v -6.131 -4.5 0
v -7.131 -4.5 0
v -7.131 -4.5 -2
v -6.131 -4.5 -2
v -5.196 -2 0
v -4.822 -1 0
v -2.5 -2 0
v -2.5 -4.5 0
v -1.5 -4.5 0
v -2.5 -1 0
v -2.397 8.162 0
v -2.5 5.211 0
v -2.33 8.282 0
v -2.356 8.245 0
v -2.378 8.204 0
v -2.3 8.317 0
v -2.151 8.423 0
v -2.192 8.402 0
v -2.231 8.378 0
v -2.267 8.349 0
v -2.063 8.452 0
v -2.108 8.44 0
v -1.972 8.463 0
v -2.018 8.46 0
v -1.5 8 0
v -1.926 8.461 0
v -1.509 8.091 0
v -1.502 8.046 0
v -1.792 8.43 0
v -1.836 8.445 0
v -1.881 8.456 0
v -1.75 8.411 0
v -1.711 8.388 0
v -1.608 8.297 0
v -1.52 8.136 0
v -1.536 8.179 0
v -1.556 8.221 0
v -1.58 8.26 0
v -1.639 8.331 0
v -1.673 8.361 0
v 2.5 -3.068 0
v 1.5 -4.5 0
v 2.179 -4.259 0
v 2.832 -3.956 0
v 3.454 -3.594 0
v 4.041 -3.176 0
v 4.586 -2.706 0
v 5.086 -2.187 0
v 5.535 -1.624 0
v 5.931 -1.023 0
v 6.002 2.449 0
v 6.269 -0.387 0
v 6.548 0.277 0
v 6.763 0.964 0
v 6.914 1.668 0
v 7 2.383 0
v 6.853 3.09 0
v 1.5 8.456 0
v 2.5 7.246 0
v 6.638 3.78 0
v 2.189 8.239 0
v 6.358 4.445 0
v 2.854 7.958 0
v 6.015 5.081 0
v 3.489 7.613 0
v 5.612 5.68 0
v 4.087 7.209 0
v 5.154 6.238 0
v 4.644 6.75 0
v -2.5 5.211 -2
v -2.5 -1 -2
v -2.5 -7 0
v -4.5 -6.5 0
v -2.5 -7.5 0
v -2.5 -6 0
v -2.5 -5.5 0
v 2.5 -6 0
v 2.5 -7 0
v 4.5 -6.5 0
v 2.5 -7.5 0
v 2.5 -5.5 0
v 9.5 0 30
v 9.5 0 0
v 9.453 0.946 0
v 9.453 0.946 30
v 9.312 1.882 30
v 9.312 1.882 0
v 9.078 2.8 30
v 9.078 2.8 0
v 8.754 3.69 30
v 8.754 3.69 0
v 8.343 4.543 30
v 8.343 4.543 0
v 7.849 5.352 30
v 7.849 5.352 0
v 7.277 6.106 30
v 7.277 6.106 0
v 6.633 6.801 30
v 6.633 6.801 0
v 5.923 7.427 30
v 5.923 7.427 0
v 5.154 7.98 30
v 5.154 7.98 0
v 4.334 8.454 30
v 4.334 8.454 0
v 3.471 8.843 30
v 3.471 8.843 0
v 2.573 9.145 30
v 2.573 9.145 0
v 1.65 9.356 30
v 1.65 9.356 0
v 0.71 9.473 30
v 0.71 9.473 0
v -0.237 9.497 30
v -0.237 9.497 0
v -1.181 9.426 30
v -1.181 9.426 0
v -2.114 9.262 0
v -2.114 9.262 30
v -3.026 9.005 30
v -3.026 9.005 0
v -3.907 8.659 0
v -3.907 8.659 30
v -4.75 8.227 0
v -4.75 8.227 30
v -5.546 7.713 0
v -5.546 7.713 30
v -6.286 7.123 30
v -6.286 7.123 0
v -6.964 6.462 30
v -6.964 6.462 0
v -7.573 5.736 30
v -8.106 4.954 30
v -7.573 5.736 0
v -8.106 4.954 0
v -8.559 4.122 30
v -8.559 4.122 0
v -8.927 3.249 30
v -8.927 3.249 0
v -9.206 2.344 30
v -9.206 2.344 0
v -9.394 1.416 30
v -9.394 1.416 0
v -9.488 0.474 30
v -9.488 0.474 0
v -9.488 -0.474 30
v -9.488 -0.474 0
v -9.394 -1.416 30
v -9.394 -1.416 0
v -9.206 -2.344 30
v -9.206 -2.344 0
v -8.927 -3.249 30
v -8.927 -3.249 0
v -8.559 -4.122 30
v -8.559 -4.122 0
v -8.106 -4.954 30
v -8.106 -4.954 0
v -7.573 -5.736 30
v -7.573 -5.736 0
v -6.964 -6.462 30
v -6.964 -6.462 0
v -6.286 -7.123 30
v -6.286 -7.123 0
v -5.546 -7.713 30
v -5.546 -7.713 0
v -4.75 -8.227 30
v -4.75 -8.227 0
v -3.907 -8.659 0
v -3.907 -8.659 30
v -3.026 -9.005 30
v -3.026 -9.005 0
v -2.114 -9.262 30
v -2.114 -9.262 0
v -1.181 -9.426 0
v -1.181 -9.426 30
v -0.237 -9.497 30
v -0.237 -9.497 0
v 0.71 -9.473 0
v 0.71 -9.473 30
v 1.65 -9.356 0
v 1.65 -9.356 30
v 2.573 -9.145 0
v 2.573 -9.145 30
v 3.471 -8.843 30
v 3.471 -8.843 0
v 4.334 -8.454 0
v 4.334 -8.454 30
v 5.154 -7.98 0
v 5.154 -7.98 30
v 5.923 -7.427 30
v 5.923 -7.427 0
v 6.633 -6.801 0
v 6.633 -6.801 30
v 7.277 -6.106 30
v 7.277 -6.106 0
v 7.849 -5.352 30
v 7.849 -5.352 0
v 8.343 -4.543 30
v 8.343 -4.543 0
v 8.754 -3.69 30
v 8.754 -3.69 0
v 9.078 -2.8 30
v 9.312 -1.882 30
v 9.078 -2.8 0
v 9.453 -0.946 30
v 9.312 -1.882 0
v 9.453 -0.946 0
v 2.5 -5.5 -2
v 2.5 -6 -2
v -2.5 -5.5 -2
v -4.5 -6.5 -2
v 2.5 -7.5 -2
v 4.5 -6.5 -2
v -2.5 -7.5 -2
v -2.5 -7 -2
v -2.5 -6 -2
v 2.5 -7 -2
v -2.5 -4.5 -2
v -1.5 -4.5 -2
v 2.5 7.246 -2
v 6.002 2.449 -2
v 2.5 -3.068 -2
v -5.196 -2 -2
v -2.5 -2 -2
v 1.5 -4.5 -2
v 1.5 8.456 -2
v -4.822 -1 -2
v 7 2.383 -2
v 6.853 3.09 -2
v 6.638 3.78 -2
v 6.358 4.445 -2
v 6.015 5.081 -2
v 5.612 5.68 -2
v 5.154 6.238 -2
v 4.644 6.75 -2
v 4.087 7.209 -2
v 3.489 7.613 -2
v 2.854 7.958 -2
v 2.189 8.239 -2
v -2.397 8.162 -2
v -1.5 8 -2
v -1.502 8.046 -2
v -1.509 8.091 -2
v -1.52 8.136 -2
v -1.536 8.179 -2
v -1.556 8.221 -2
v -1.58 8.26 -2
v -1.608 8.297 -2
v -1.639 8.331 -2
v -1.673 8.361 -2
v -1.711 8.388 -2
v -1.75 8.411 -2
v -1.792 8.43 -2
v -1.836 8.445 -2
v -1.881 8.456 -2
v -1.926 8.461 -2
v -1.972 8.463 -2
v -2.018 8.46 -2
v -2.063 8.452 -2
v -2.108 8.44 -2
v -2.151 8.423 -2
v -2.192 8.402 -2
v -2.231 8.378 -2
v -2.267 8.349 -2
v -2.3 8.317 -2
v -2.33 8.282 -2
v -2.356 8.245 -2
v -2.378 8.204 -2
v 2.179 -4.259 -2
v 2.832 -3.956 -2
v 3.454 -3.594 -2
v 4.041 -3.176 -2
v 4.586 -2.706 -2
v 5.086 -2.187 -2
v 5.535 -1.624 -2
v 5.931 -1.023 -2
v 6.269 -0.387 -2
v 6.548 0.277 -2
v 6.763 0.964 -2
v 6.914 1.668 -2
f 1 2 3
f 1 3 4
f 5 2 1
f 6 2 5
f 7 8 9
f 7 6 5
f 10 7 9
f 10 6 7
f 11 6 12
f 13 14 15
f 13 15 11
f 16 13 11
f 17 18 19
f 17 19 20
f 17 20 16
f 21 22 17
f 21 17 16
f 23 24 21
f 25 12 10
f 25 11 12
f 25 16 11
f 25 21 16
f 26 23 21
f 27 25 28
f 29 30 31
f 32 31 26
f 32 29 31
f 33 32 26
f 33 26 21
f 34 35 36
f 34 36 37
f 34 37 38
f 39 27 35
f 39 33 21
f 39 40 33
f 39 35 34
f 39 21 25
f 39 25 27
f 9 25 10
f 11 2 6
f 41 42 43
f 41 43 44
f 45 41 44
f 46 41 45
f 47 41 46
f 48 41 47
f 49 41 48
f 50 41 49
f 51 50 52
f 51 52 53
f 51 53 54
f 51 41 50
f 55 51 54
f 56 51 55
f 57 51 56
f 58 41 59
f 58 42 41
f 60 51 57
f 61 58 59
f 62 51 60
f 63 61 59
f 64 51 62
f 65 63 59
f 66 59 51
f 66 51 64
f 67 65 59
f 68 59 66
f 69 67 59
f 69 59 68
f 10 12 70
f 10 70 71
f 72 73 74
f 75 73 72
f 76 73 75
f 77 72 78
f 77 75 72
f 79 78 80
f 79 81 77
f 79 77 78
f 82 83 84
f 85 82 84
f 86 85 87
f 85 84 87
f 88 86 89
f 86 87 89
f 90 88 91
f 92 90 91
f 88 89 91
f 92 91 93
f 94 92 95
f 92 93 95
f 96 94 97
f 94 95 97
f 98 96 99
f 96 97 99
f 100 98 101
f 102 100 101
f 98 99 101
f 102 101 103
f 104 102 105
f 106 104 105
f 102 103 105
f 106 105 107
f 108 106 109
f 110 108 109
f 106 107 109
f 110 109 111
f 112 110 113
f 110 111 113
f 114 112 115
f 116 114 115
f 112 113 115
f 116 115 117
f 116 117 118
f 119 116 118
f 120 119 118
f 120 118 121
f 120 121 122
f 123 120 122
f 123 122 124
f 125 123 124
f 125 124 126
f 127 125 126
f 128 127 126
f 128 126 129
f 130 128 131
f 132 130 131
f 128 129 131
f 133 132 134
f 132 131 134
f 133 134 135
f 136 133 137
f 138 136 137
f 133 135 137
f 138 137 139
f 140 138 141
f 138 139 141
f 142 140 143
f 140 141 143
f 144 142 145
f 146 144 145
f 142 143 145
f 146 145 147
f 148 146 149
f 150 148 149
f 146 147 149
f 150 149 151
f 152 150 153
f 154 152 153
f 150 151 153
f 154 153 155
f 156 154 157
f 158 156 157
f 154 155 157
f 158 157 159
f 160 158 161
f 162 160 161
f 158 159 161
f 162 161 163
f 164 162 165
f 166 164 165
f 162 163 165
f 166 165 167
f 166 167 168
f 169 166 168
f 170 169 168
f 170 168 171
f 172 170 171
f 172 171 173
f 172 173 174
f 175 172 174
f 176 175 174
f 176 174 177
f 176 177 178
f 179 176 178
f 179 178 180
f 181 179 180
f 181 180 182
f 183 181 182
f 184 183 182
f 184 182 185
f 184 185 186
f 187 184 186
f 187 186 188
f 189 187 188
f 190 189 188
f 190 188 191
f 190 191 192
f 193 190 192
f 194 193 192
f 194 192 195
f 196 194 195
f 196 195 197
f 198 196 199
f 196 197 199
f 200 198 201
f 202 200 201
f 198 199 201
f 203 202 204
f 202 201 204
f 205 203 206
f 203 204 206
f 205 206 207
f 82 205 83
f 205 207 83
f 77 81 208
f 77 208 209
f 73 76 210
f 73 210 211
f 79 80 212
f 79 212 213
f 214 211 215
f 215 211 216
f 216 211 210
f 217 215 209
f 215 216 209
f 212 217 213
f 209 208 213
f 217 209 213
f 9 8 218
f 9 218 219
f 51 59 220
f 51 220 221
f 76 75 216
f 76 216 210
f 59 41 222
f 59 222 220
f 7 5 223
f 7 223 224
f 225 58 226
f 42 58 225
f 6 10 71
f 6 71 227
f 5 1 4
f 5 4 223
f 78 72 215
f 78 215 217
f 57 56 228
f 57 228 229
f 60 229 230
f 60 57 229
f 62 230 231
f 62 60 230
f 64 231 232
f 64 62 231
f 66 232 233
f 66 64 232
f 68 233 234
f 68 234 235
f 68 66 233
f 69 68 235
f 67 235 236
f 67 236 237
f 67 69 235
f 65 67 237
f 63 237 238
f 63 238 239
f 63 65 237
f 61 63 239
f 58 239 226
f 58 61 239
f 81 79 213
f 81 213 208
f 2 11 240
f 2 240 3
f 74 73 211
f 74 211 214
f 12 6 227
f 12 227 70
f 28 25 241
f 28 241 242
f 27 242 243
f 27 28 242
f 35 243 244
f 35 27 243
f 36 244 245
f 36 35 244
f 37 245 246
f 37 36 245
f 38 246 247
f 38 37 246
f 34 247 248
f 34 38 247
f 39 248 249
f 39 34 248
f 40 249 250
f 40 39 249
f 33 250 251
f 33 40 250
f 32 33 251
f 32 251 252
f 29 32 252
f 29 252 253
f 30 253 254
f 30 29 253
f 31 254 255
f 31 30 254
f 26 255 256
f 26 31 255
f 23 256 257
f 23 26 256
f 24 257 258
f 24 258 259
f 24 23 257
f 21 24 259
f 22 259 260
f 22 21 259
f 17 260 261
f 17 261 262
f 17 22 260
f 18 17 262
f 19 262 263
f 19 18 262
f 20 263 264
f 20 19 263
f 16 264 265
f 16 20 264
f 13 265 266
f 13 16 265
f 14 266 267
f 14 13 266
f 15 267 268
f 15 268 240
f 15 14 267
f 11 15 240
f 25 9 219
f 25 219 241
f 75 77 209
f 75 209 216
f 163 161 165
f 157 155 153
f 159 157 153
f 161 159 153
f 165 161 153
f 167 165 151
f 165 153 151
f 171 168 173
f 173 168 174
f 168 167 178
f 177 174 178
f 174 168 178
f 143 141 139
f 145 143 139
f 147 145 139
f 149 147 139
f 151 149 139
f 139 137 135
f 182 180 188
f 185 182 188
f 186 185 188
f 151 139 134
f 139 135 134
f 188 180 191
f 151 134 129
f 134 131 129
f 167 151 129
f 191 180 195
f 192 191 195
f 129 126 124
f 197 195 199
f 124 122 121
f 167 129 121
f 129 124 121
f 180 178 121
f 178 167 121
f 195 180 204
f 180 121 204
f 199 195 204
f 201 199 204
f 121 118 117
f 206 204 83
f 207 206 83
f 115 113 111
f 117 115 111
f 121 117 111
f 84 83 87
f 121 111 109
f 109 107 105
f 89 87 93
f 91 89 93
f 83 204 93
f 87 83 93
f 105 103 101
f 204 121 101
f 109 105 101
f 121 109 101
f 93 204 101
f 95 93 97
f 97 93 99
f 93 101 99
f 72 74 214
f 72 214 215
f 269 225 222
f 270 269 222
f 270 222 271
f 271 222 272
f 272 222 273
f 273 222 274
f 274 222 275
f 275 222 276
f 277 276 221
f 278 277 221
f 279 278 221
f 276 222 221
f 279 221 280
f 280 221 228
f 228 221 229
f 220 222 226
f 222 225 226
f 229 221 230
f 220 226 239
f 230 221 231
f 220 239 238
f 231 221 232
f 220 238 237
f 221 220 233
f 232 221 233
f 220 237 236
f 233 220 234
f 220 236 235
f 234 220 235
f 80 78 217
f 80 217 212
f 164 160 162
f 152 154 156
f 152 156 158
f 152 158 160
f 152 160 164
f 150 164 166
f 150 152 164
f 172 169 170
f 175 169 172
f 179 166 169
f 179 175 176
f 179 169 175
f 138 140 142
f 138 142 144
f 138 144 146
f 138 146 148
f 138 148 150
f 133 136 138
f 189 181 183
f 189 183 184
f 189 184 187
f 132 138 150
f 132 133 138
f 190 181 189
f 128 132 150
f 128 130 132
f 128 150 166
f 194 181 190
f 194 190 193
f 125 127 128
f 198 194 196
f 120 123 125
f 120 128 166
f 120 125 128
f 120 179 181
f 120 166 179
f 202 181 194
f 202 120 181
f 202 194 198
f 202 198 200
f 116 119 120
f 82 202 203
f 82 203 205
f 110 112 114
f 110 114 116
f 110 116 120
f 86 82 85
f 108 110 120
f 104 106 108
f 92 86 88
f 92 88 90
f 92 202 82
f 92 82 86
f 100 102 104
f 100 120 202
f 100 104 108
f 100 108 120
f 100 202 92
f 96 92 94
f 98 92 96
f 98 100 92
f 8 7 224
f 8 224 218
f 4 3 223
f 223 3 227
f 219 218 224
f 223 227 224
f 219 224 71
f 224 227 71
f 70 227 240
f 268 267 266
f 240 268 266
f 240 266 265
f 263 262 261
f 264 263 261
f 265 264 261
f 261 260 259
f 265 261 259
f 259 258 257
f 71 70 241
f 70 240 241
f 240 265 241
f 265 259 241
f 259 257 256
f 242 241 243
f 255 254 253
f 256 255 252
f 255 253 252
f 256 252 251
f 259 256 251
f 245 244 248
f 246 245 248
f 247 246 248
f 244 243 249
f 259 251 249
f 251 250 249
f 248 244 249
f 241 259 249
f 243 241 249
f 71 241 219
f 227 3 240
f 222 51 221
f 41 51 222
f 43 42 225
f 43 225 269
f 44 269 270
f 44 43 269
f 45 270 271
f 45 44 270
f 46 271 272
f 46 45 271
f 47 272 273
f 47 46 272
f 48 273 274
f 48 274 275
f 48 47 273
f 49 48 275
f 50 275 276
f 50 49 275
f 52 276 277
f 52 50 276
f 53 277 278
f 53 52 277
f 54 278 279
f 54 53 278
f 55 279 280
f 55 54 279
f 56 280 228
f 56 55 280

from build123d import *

# Parameters (mm, degrees)
F1_DEPTH = 2
F0_R     = 9.5
F2_DEPTH = 30


with BuildPart() as f1:
    # F0 (on Top) → F1 (new body)
    with BuildSketch(Plane.XY):
        with BuildLine():
            Line((-2.5, -4.5), (-1.5, -4.5))
            Line((-1.5, -4.5), (-1.5, 8))
            ThreePointArc((-1.5, 8), (-1.8805656371, 8.4555551787), (-2.3965696716, 8.1621262073))
            Line((-2.3965696716, 8.1621262073), (-7.1307446703, -4.5))
            Line((-7.1307446703, -4.5), (-6.1307446703, -4.5))
            Line((-6.1307446703, -4.5), (-5.1960329715, -2))
            Line((-5.1960329715, -2), (-2.5, -2))
            Line((-2.5, -2), (-2.5, -4.5))
        make_face()
        Polygon((-2.5, -1), (-4.8221482921, -1), (-2.5, 5.210867734), align=None, mode=Mode.SUBTRACT)
    extrude(amount=-F1_DEPTH)


with BuildPart() as f1b:
    # F0 (on Top) → F1, piece 2 (new body)
    with BuildSketch(Plane.XY):
        with BuildLine():
            Line((1.5, 8.4555551787), (1.5, -4.5))
            ThreePointArc((1.5, -4.5), (5.317050605, -1.9109756291), (7, 2.3832767911))
            ThreePointArc((7, 2.3832767911), (5.154069353, 6.2382818411), (1.5, 8.4555551787))
        make_face()
        Polygon((2.5, -3.0675162561), (2.5, 7.2462004609), (6.0021702136, 2.449122956), align=None, mode=Mode.SUBTRACT)
    extrude(amount=-F1_DEPTH)


with BuildPart() as f1c:
    # F0 (on Top) → F1, piece 3 (new body)
    with BuildSketch(Plane.XY):
        Polygon((2.5, -6), (-2.5, -6), (-2.5, -5.5), (-4.5, -6.5), (-2.5, -7.5), (-2.5, -7), (2.5, -7), (2.5, -7.5), (4.5, -6.5), (2.5, -5.5), align=None)
    extrude(amount=-F1_DEPTH)


with BuildPart() as f2:
    # F0 (on Top) → F2 (new body)
    with BuildSketch(Plane.XY):
        Circle(F0_R)
        Polygon((-2.5, -5.5), (-2.5, -6), (2.5, -6), (2.5, -5.5), (4.5, -6.5), (2.5, -7.5), (2.5, -7), (-2.5, -7), (-2.5, -7.5), (-4.5, -6.5), align=None, mode=Mode.SUBTRACT)
        with BuildLine():
            Line((-1.5, 8), (-1.5, -4.5))
            Line((-1.5, -4.5), (-2.5, -4.5))
            Line((-2.5, -4.5), (-2.5, -2))
            Line((-2.5, -2), (-5.1960329715, -2))
            Line((-5.1960329715, -2), (-6.1307446703, -4.5))
            Line((-6.1307446703, -4.5), (-7.1307446703, -4.5))
            Line((-7.1307446703, -4.5), (-2.3965696716, 8.1621262073))
            ThreePointArc((-2.3965696716, 8.1621262073), (-1.8805656371, 8.4555551787), (-1.5, 8))
        make_face(mode=Mode.SUBTRACT)
        with BuildLine():
            ThreePointArc((7, 2.3832767911), (5.317050605, -1.9109756291), (1.5, -4.5))
            Line((1.5, -4.5), (1.5, 8.4555551787))
            ThreePointArc((1.5, 8.4555551787), (5.154069353, 6.2382818411), (7, 2.3832767911))
        make_face(mode=Mode.SUBTRACT)
        with BuildLine():
            Line((1.5, 8.4555551787), (1.5, -4.5))
            ThreePointArc((1.5, -4.5), (5.317050605, -1.9109756291), (7, 2.3832767911))
            ThreePointArc((7, 2.3832767911), (5.154069353, 6.2382818411), (1.5, 8.4555551787))
        make_face()
        Polygon((2.5, -3.0675162561), (2.5, 7.2462004609), (6.0021702136, 2.449122956), align=None, mode=Mode.SUBTRACT)
        with BuildLine():
            Line((-2.5, -4.5), (-1.5, -4.5))
            Line((-1.5, -4.5), (-1.5, 8))
            ThreePointArc((-1.5, 8), (-1.8805656371, 8.4555551787), (-2.3965696716, 8.1621262073))
            Line((-2.3965696716, 8.1621262073), (-7.1307446703, -4.5))
            Line((-7.1307446703, -4.5), (-6.1307446703, -4.5))
            Line((-6.1307446703, -4.5), (-5.1960329715, -2))
            Line((-5.1960329715, -2), (-2.5, -2))
            Line((-2.5, -2), (-2.5, -4.5))
        make_face()
        Polygon((-2.5, -1), (-4.8221482921, -1), (-2.5, 5.210867734), align=None, mode=Mode.SUBTRACT)
        Polygon((6.0021702136, 2.449122956), (2.5, 7.2462004609), (2.5, -3.0675162561), align=None)
        Polygon((2.5, -6), (-2.5, -6), (-2.5, -5.5), (-4.5, -6.5), (-2.5, -7.5), (-2.5, -7), (2.5, -7), (2.5, -7.5), (4.5, -6.5), (2.5, -5.5), align=None)
        Polygon((-2.5, 5.210867734), (-4.8221482921, -1), (-2.5, -1), align=None)
    extrude(amount=F2_DEPTH)


solid = Compound([f1.part, f1b.part, f1c.part, f2.part])
